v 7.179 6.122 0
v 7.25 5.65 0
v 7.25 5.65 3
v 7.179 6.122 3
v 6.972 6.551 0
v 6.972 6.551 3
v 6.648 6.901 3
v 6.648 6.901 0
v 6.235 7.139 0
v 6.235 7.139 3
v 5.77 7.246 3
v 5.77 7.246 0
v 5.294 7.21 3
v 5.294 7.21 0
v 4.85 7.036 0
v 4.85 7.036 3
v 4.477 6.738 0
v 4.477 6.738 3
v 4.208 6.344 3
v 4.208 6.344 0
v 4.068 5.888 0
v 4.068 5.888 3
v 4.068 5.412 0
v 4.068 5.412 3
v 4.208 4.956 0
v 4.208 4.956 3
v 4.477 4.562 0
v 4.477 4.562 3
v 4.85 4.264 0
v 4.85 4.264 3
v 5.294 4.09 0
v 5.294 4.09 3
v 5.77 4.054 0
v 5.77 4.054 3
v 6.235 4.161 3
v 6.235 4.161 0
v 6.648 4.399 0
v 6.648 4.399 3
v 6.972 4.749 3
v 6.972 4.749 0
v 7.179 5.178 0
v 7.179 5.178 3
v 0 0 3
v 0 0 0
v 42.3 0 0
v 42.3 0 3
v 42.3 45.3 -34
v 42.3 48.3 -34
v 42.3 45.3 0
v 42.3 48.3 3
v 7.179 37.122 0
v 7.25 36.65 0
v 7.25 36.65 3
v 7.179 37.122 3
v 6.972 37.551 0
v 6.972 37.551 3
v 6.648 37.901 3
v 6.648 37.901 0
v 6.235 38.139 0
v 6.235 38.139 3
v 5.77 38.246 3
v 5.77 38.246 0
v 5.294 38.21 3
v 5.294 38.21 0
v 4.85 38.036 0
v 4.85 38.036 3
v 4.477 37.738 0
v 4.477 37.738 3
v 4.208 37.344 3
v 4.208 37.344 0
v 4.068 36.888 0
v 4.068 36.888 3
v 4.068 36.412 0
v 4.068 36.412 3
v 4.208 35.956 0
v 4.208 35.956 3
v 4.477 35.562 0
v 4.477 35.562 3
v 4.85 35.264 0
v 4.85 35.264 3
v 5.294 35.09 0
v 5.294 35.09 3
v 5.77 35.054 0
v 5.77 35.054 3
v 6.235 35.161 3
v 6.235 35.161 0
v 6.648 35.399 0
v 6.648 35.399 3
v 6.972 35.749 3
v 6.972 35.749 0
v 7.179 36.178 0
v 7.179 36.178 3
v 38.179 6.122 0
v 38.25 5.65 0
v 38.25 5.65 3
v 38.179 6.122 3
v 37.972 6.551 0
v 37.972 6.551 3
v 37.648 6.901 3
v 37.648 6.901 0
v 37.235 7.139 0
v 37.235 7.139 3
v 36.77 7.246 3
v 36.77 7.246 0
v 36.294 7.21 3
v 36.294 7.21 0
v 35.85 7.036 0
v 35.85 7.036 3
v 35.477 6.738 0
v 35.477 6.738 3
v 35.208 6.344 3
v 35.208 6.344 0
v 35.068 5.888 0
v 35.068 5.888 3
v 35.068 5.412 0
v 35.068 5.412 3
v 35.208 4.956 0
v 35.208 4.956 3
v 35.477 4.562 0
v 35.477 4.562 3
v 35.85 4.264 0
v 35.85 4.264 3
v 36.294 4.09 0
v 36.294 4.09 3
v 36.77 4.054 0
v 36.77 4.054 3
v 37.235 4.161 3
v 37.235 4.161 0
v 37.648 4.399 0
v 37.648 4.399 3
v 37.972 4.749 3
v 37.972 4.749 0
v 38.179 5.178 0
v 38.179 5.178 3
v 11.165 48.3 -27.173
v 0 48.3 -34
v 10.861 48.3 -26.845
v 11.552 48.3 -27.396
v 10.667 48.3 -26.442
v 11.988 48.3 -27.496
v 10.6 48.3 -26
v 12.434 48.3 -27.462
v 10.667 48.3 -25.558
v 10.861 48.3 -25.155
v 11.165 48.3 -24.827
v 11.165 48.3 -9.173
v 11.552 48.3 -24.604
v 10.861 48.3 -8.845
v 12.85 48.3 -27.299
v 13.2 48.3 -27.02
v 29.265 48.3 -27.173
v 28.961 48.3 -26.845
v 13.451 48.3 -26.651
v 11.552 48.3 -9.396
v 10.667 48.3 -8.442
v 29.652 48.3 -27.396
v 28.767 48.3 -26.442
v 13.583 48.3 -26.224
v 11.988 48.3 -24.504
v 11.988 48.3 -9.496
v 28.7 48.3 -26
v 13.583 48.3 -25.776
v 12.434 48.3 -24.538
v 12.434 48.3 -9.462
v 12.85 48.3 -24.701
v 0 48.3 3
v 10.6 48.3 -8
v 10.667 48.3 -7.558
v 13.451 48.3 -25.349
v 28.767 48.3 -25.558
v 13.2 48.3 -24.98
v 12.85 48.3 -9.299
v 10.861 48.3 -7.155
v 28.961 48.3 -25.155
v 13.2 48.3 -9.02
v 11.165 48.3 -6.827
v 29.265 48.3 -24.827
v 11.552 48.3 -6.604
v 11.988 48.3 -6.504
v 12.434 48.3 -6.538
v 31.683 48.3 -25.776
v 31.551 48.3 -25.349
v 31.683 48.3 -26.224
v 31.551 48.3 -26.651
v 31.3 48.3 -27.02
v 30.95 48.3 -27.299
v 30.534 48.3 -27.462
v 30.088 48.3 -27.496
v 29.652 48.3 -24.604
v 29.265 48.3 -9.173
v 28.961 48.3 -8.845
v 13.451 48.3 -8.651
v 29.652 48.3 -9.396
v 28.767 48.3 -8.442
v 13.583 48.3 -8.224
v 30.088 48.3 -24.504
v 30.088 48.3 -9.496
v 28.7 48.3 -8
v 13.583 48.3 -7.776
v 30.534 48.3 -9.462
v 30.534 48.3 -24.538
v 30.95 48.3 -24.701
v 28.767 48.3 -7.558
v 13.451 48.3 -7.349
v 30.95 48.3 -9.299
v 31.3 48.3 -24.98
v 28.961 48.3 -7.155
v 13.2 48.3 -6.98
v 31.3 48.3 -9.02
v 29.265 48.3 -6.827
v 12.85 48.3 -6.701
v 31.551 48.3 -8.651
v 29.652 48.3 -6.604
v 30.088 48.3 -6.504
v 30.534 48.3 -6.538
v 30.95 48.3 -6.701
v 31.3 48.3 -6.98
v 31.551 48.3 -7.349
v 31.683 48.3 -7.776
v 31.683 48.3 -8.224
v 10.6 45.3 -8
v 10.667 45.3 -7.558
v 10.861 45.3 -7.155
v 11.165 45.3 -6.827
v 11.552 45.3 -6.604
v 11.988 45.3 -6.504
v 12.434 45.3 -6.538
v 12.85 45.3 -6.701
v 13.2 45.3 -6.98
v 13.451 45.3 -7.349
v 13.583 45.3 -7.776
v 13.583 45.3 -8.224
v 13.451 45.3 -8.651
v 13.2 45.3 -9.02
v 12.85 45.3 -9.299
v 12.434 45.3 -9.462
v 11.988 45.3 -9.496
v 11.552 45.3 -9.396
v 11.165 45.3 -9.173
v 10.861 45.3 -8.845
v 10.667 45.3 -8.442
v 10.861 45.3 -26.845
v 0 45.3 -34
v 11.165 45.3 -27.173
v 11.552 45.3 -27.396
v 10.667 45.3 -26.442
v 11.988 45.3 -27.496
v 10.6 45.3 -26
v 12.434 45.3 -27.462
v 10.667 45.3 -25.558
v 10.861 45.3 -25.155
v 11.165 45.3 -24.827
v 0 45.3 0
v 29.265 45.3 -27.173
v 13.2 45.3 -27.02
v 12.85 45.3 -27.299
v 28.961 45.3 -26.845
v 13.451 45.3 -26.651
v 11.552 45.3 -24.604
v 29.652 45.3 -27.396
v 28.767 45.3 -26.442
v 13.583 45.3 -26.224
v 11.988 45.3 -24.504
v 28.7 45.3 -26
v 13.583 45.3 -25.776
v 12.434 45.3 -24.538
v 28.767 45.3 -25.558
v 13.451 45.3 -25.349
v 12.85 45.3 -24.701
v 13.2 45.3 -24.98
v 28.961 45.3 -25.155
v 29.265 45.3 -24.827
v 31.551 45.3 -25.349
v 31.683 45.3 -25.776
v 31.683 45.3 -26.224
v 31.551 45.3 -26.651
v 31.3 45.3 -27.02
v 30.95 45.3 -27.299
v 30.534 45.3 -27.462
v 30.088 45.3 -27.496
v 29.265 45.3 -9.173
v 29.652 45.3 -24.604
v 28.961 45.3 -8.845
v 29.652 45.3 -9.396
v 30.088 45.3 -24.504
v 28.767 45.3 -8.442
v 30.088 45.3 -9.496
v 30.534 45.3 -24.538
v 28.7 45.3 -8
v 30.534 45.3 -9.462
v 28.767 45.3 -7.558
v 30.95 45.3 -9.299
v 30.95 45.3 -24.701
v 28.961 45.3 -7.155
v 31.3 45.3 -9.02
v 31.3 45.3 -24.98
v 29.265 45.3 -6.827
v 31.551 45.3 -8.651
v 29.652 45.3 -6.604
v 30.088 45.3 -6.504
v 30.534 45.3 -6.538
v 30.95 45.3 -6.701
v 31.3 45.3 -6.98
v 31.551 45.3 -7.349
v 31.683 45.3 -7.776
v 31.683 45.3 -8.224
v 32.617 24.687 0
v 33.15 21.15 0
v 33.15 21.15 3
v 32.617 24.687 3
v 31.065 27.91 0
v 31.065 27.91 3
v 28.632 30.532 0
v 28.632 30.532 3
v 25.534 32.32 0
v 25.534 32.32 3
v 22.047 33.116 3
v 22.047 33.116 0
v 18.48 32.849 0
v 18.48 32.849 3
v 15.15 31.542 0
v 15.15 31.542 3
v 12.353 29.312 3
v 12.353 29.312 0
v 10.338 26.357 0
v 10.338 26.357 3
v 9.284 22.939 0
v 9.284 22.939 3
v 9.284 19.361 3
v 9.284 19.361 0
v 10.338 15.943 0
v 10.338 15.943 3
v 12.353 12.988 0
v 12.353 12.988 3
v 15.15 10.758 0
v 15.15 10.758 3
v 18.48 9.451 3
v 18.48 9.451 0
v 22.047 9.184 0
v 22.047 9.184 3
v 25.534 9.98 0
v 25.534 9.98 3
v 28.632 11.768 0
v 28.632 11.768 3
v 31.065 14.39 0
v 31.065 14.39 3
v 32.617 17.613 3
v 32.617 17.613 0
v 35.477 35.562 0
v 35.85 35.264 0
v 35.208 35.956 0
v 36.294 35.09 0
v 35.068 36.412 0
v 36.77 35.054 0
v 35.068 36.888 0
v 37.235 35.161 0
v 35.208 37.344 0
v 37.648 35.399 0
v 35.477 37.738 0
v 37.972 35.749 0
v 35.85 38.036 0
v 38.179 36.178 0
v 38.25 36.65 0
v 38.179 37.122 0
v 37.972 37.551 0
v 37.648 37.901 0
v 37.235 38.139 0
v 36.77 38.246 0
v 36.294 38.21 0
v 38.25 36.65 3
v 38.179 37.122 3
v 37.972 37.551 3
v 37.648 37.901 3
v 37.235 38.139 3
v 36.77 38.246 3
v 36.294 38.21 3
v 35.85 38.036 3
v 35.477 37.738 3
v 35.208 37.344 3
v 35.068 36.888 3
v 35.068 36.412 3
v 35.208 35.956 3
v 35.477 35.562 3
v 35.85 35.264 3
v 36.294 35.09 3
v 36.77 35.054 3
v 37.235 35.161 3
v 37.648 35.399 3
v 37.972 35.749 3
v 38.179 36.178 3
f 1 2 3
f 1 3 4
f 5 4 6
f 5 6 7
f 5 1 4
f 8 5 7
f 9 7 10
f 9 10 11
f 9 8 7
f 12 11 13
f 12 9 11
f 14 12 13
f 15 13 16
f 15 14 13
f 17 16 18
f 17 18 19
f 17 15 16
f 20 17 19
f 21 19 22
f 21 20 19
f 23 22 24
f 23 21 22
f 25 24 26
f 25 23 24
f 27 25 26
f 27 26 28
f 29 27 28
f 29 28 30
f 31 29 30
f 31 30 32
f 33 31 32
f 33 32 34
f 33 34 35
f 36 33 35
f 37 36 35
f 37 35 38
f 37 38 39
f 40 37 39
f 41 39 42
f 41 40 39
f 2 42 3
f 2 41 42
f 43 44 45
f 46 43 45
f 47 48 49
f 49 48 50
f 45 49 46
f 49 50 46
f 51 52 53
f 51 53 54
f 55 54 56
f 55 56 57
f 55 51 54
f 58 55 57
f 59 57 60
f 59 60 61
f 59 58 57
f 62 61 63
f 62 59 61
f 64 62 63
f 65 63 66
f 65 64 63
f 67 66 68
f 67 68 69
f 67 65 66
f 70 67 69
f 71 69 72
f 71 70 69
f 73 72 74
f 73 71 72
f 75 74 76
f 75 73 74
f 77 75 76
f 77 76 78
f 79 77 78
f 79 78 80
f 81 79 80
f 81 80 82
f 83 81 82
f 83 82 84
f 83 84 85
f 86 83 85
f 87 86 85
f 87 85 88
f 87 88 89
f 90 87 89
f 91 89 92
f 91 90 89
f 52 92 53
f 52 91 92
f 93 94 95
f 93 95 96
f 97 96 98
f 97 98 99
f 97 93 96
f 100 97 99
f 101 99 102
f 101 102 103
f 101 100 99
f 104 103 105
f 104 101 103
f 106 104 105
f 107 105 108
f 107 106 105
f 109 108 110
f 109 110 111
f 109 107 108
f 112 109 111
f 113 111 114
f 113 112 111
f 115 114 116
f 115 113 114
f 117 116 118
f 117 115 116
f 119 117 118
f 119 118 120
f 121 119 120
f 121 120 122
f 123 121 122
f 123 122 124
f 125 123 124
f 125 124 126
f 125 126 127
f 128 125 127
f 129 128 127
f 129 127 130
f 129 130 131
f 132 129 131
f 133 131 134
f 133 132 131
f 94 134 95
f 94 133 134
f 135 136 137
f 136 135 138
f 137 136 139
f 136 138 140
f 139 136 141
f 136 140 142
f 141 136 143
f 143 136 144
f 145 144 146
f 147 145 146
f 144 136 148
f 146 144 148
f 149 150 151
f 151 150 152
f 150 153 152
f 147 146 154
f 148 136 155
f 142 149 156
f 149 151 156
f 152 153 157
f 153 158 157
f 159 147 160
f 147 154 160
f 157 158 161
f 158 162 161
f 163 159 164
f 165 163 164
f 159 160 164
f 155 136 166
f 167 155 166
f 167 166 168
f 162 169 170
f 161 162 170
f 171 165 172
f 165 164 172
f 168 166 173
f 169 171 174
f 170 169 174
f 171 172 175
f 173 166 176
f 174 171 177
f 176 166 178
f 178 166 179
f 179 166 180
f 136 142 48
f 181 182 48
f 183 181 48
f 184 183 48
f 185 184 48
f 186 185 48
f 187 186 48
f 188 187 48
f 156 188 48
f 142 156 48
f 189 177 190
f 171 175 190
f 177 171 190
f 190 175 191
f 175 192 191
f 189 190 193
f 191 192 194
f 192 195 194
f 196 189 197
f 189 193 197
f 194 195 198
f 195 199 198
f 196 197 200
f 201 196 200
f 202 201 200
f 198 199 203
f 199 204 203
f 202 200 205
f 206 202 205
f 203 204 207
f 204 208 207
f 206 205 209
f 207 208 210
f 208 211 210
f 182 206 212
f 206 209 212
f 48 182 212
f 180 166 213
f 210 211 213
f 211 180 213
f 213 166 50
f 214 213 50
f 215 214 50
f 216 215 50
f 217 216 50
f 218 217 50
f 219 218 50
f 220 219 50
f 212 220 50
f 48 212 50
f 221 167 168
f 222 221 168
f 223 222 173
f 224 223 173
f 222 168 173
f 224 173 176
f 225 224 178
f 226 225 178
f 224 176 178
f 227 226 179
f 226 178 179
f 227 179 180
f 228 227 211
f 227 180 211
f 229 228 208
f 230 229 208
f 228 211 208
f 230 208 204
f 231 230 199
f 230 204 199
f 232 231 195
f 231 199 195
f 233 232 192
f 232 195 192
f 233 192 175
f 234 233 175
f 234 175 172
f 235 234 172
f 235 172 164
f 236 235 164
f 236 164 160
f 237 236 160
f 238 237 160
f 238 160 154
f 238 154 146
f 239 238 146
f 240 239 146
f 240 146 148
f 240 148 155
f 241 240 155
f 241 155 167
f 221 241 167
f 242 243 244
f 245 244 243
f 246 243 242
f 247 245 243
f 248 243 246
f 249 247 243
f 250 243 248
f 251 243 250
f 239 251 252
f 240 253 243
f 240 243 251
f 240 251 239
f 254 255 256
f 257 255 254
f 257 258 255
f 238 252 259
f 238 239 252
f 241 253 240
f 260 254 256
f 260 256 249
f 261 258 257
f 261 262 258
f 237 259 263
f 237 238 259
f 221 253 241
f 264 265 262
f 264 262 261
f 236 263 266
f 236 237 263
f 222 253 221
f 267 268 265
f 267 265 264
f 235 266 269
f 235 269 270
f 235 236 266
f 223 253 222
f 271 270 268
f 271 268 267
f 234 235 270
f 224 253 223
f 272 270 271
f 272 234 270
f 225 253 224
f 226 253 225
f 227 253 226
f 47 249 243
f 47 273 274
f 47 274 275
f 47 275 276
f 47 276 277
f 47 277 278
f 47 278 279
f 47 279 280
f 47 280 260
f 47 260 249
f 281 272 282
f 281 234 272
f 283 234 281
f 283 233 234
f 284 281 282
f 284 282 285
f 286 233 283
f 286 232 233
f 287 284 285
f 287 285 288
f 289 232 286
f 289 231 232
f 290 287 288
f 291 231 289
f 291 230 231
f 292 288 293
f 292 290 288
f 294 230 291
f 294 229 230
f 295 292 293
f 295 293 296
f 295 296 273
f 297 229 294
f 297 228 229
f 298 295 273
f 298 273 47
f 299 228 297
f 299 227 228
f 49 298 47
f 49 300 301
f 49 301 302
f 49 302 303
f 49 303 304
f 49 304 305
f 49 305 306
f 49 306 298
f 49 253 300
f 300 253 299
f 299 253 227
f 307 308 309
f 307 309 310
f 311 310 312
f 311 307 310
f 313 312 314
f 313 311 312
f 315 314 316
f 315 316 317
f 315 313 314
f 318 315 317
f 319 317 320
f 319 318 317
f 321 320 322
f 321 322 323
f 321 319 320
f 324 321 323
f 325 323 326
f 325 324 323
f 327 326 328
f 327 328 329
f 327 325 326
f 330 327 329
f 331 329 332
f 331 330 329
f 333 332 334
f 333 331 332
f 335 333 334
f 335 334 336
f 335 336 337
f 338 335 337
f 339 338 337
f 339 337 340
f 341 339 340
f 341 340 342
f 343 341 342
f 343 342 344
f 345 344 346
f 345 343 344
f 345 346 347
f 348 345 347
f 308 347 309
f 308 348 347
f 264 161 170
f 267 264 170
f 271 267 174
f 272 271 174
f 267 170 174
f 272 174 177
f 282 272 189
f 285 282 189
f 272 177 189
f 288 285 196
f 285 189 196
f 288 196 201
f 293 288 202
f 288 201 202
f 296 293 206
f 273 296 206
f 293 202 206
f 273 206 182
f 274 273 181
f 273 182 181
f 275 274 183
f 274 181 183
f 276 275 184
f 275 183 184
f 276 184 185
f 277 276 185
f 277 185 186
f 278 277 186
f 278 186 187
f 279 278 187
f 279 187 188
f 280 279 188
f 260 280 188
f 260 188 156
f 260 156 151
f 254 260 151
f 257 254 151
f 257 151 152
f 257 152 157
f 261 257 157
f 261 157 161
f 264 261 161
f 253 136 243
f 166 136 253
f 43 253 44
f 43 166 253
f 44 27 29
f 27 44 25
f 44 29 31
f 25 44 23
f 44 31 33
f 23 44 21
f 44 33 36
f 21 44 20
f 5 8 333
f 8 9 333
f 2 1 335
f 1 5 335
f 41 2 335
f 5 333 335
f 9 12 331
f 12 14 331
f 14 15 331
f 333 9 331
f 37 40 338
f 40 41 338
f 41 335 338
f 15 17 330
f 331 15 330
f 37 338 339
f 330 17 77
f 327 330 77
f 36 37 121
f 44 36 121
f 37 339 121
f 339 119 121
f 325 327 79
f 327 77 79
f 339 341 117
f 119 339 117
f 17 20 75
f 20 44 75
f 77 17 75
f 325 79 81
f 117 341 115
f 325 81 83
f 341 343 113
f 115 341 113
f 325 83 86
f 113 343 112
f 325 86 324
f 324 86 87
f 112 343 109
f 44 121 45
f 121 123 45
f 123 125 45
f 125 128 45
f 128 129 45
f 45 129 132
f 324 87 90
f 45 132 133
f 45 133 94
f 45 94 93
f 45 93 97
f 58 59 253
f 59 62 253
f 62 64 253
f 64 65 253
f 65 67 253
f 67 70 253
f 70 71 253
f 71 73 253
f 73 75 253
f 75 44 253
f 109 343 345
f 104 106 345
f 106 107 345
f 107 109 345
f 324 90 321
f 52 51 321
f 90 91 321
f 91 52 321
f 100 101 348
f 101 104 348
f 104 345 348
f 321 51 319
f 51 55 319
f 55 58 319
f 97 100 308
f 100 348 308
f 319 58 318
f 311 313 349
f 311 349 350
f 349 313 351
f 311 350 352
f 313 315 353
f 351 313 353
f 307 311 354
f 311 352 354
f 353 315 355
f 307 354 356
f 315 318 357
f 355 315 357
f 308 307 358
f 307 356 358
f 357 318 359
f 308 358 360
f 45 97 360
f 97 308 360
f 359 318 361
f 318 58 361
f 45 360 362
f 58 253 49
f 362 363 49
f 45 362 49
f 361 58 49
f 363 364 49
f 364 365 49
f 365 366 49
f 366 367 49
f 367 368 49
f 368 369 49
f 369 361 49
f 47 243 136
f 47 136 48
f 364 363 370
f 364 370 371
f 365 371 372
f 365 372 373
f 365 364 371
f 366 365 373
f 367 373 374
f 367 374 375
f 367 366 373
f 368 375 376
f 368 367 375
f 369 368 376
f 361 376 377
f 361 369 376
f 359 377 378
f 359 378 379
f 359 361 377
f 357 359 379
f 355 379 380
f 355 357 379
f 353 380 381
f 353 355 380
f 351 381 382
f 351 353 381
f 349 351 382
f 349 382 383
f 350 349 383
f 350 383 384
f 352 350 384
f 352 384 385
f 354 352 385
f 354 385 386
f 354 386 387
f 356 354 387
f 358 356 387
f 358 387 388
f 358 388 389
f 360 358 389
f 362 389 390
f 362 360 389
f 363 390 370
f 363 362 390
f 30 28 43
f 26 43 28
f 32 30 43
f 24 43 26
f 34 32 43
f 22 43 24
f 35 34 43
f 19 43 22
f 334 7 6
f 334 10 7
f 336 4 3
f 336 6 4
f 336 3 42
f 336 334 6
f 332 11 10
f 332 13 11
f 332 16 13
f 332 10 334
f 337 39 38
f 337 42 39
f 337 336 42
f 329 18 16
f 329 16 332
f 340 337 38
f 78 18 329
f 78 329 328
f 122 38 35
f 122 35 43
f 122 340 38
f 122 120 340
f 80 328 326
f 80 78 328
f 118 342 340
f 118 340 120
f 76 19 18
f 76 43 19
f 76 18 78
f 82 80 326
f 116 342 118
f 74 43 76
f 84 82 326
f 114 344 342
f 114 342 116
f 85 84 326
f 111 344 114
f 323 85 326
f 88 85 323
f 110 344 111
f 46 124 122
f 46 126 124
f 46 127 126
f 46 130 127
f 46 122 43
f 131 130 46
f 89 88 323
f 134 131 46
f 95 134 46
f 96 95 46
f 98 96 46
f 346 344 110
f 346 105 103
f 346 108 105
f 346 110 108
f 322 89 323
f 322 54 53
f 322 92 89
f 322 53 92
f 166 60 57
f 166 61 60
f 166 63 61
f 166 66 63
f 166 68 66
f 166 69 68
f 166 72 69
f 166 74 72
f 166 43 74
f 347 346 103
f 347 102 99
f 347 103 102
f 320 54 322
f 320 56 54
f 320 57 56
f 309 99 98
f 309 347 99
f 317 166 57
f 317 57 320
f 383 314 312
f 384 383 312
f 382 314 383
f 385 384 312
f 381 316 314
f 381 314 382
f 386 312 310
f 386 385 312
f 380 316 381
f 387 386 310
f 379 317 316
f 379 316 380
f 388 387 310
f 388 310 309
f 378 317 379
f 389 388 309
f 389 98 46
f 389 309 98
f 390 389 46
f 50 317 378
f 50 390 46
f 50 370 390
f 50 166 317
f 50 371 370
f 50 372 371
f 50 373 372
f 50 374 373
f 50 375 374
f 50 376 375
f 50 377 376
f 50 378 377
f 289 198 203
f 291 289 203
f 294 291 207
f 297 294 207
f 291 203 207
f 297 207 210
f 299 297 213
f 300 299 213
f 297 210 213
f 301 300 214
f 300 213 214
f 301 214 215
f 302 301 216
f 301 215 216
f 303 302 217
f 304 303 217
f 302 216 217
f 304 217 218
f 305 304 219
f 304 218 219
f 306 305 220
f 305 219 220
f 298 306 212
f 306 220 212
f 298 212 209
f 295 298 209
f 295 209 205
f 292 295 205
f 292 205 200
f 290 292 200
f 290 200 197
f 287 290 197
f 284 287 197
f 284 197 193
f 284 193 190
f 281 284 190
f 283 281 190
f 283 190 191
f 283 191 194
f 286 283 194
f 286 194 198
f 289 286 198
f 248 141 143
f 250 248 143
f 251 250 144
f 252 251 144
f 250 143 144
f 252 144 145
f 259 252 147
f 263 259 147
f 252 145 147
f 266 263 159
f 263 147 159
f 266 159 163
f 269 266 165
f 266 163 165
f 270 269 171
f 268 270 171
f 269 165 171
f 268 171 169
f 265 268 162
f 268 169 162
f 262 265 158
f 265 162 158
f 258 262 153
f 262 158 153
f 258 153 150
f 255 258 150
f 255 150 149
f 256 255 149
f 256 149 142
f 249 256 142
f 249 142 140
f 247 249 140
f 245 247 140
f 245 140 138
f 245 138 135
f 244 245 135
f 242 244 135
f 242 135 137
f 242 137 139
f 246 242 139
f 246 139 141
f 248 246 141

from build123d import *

# Parameters (mm, degrees)
SKETCH_W     = 42.3
SKETCH_H     = 48.3
SKETCH_R     = 1.6
SKETCH_R_2   = 12
PAD_DEPTH    = 3
SKETCH001_W  = 42.3
SKETCH001_H  = 3
PAD001_DEPTH = 34
SKETCH002_R  = 1.5
POCKET_DEPTH = 48.301


with BuildPart() as part:
    # Sketch → Pad (new body)
    with BuildSketch(Plane.XY):
        with Locations((21.15, 24.15)):
            Rectangle(SKETCH_W, SKETCH_H)
        with Locations((5.65, 36.65)):
            Circle(SKETCH_R, mode=Mode.SUBTRACT)
        with Locations((36.65, 36.65)):
            Circle(SKETCH_R, mode=Mode.SUBTRACT)
        with Locations((5.65, 5.65)):
            Circle(SKETCH_R, mode=Mode.SUBTRACT)
        with Locations((36.65, 5.65)):
            Circle(SKETCH_R, mode=Mode.SUBTRACT)
        with Locations((21.15, 21.15)):
            Circle(SKETCH_R_2, mode=Mode.SUBTRACT)
    extrude(amount=PAD_DEPTH)

    # Sketch001 → Pad001 (new body)
    with BuildSketch(Plane(origin=(0, 0, 0), x_dir=(1, 0, 0), z_dir=(0, 0, -1))):
        with Locations((21.15, -46.8)):
            Rectangle(SKETCH001_W, SKETCH001_H)
    extrude(amount=PAD001_DEPTH)

    # Sketch002 → Pocket (cut, through all)
    with BuildSketch(Plane(origin=(0, 48.3, 0), x_dir=(-1, 0, 0), z_dir=(0, 1, 0))):
        with Locations((-30.2, -8)):
            Circle(SKETCH002_R)
        with Locations((-12.1, -8)):
            Circle(SKETCH002_R)
        with Locations((-30.2, -26)):
            Circle(SKETCH002_R)
        with Locations((-12.1, -26)):
            Circle(SKETCH002_R)
    extrude(amount=-POCKET_DEPTH, mode=Mode.SUBTRACT)


solid = part.part
